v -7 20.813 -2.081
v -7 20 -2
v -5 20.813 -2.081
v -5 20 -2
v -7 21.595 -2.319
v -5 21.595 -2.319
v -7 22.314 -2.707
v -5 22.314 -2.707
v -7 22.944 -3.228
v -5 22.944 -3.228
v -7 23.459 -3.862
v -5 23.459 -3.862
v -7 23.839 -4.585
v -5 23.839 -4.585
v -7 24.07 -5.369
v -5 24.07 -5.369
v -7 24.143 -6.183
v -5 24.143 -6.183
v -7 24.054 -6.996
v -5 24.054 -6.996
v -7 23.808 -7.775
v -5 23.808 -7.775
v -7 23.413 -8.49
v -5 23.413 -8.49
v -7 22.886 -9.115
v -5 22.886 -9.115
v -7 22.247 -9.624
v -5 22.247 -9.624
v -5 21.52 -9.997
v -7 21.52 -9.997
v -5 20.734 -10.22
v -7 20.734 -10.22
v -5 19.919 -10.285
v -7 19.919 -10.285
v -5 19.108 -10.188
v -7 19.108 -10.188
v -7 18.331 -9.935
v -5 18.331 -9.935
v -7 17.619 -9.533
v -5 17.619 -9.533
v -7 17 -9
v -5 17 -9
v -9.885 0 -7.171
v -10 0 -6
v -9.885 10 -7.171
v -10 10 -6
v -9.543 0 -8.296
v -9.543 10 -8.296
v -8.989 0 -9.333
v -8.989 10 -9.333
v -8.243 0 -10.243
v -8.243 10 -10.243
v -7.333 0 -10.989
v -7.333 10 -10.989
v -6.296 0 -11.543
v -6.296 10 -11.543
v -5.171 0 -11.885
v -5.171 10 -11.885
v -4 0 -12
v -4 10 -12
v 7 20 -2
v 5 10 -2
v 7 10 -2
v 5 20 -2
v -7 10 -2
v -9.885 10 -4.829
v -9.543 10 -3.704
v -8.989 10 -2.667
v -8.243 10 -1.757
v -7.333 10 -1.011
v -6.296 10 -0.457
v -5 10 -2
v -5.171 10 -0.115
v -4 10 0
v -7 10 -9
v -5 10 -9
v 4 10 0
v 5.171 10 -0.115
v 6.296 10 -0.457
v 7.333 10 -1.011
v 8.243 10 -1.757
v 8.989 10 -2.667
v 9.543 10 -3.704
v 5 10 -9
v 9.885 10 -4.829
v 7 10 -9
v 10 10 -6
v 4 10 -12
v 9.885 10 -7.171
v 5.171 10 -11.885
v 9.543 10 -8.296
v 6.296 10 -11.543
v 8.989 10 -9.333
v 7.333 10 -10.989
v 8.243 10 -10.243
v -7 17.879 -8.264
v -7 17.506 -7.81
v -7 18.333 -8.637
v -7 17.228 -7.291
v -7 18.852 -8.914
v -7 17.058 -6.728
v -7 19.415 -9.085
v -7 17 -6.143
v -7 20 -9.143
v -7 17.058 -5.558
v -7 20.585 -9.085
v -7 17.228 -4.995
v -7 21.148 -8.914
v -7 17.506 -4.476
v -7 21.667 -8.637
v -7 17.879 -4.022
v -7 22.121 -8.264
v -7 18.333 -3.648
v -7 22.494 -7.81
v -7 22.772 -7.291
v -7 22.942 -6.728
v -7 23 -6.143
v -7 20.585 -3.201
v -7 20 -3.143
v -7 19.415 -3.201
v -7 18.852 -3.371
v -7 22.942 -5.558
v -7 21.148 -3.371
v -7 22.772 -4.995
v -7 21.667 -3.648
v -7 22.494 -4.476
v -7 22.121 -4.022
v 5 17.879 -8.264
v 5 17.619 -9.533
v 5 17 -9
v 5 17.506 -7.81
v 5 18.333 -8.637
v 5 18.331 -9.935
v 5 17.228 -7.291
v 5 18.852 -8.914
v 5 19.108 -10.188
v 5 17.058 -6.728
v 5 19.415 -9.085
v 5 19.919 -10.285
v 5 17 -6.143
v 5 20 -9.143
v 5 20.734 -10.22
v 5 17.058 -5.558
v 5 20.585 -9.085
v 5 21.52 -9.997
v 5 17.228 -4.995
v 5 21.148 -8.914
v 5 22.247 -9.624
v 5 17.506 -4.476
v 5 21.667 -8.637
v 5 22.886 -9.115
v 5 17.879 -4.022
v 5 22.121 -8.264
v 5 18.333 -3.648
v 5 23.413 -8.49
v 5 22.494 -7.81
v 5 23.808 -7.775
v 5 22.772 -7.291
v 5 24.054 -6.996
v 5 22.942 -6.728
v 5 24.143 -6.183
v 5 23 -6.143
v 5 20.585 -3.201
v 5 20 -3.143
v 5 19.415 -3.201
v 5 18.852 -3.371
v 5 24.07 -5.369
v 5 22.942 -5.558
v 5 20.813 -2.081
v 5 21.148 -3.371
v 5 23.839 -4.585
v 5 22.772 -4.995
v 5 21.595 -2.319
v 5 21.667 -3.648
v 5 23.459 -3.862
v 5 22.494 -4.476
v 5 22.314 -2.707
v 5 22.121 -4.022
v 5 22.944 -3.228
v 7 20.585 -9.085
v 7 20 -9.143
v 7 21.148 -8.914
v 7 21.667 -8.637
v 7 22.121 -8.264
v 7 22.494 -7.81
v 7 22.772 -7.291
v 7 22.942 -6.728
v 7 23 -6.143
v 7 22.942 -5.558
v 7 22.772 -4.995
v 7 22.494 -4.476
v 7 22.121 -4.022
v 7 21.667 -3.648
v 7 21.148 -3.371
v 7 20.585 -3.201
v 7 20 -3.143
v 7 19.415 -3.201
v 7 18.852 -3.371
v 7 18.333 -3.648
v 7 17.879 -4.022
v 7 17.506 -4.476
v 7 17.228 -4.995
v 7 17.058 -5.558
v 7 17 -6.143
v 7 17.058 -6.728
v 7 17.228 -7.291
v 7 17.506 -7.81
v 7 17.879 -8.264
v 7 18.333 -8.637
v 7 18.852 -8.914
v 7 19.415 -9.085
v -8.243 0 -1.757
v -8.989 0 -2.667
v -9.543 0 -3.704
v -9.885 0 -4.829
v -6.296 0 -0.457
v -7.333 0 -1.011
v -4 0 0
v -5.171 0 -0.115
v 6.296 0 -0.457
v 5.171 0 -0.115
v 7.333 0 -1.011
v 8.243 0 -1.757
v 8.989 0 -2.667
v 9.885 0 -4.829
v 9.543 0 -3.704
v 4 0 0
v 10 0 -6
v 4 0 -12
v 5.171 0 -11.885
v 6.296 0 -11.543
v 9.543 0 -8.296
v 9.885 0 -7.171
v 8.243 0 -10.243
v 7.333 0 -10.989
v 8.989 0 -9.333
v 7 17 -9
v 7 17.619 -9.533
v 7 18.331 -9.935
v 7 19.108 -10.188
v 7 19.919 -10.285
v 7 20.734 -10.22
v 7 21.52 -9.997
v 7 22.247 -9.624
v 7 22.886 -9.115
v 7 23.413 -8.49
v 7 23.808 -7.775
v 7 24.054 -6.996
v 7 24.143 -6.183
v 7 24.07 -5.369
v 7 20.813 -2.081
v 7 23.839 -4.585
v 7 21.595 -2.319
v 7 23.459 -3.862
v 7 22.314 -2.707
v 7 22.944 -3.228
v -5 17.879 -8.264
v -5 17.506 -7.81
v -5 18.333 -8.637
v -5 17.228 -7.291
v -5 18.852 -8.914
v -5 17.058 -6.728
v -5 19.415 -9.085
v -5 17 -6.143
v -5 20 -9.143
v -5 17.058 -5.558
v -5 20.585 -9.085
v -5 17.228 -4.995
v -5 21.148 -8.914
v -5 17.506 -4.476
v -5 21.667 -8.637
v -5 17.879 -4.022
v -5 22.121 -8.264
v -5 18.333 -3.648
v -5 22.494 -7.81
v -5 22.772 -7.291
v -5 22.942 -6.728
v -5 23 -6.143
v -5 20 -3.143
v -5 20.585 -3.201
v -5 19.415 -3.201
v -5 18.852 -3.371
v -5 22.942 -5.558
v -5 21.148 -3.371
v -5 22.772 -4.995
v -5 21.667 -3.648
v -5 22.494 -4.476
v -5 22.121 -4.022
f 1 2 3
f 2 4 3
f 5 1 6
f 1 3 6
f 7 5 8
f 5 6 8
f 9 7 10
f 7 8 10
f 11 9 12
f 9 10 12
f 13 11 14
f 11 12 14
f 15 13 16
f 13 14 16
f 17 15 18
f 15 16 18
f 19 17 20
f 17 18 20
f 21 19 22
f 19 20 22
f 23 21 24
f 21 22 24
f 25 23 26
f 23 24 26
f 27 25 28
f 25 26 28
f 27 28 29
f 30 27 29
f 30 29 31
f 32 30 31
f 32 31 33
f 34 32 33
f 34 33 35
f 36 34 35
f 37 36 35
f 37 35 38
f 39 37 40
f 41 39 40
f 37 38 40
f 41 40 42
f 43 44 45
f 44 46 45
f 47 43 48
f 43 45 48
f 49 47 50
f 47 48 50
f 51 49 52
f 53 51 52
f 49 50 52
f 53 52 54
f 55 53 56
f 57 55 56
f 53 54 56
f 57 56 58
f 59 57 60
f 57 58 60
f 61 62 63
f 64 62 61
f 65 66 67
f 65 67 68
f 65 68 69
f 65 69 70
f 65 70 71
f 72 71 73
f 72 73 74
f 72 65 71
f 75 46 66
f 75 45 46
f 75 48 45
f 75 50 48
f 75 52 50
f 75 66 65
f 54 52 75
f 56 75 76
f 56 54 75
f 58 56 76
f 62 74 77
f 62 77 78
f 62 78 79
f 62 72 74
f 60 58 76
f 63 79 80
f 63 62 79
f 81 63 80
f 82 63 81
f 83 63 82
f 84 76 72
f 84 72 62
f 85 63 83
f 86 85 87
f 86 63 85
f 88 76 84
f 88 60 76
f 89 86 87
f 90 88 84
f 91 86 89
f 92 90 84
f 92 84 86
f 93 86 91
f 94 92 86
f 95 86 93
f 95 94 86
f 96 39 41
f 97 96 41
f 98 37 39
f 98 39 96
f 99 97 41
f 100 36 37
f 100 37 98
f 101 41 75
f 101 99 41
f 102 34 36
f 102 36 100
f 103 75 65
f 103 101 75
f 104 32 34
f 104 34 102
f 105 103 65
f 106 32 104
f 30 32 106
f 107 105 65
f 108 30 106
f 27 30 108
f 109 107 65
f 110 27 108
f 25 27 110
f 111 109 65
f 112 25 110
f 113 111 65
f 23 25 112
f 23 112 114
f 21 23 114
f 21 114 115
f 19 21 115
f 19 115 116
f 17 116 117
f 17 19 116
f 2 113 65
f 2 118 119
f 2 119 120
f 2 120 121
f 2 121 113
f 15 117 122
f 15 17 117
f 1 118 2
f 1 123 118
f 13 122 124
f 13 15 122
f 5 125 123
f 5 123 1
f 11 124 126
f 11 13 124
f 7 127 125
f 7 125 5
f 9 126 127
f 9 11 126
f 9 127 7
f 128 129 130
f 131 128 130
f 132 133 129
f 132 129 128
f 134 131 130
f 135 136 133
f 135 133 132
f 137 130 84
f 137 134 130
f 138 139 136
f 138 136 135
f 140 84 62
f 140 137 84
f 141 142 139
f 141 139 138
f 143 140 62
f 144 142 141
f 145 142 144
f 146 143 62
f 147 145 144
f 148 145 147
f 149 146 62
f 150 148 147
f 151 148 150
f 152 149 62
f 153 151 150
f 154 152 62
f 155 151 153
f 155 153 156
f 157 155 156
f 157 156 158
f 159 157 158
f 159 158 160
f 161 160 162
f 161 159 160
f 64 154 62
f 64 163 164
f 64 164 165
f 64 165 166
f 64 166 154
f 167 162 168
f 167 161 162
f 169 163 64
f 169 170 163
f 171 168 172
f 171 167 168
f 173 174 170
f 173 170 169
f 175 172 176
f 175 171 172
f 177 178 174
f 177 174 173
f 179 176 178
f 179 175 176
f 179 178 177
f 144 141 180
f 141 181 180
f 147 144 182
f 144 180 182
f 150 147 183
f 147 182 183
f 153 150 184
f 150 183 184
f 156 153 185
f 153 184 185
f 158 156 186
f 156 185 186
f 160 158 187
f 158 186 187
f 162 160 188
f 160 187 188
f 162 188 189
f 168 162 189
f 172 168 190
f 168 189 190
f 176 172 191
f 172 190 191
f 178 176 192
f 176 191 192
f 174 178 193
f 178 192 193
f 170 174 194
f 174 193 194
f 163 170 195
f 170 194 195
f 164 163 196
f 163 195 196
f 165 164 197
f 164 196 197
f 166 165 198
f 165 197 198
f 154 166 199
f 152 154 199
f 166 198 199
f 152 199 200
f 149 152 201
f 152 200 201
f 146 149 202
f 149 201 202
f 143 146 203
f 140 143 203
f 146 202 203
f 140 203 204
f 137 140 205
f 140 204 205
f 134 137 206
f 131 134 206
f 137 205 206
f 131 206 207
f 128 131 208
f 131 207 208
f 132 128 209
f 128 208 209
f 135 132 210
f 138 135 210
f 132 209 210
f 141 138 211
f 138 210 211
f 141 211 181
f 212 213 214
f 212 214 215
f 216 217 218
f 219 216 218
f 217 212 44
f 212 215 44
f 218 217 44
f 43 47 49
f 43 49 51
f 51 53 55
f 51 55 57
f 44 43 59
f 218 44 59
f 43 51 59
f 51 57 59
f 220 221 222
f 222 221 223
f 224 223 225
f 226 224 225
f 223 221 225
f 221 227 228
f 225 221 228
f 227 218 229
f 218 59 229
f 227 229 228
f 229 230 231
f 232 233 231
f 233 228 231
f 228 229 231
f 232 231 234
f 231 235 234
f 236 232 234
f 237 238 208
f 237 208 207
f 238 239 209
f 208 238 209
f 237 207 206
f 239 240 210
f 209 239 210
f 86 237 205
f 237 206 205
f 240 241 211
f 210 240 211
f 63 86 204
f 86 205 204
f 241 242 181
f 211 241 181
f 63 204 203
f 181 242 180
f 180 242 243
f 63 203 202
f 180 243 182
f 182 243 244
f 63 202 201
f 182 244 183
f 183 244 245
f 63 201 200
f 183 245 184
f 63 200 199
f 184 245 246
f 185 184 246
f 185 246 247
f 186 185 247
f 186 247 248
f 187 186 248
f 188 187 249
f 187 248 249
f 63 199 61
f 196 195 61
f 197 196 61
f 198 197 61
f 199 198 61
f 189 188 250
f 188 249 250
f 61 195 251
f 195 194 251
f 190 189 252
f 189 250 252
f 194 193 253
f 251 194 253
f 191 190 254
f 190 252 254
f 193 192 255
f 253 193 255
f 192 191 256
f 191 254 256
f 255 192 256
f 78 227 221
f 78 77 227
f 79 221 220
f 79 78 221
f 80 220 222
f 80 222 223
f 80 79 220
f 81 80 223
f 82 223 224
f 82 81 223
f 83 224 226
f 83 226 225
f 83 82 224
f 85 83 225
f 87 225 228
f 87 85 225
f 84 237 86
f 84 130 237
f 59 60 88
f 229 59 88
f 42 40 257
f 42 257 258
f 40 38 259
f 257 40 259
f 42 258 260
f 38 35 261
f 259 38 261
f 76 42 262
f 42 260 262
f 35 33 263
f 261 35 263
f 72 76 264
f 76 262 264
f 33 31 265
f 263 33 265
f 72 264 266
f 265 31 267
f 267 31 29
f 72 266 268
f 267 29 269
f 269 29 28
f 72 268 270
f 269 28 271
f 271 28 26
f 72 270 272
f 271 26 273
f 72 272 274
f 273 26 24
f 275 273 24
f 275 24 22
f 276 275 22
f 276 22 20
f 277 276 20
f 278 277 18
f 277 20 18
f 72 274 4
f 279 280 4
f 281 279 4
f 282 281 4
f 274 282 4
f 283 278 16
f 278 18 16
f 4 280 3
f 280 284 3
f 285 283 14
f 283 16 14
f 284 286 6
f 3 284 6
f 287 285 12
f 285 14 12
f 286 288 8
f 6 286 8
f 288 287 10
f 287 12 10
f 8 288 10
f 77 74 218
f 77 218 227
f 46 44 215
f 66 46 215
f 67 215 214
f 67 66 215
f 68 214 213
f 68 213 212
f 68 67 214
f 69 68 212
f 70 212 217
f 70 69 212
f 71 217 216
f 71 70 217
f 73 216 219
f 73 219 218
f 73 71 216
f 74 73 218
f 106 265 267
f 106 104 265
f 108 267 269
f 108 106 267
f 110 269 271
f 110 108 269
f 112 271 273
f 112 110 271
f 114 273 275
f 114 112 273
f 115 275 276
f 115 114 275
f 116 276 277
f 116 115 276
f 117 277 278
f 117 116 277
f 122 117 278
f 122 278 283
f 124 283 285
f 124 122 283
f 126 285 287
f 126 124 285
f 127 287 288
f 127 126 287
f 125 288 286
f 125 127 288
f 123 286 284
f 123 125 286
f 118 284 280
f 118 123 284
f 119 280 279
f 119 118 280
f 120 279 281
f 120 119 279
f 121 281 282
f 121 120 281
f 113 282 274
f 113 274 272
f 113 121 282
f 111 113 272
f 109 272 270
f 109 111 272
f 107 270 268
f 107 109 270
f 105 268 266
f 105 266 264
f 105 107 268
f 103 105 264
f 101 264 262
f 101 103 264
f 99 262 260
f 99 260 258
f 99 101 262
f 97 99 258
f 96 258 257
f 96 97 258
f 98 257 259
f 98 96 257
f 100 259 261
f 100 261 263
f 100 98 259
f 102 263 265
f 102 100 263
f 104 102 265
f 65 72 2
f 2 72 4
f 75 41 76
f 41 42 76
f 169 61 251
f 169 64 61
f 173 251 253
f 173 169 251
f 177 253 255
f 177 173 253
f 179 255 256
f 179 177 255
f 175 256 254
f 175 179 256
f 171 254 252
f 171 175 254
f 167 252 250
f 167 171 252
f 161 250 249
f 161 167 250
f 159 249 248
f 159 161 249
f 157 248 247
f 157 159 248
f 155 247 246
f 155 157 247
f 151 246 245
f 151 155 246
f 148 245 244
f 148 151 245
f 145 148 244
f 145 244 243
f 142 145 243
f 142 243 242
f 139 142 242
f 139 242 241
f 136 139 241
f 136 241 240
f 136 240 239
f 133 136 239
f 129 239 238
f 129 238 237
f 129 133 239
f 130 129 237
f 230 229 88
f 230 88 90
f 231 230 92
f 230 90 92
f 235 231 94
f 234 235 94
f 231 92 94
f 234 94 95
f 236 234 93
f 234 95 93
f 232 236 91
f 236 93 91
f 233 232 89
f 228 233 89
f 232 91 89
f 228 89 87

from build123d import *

# Parameters (mm, degrees)
SKETCH1_W           = 20
SKETCH1_H           = 12
BOSS_EXTRUDE1_DEPTH = 10
SKETCH4_R           = 3
BOSS_EXTRUDE2_DEPTH = 1
FILLET1_R           = 6


with BuildPart() as part:
    # Sketch1 → Boss-Extrude1 (new body)
    with BuildSketch(Plane(origin=(0, 0, 0), x_dir=(1, 0, 0), z_dir=(0, 1, 0))):
        with Locations((0, 6)):
            Rectangle(SKETCH1_W, SKETCH1_H)
    extrude(amount=BOSS_EXTRUDE1_DEPTH)

    # Sketch4 → Boss-Extrude2 (add, symmetric)
    with BuildSketch(Plane(origin=(-6, 0, 0), x_dir=(0, 0, -1), z_dir=(1, 0, 0))):
        with BuildLine():
            Line((2, 10), (2, 20))
            ThreePointArc((2, 20), (7.774808523, 23.807886553), (9, 17))
            Line((9, 17), (9, 10))
            Line((9, 10), (2, 10))
        make_face()
        with Locations((6.142857143, 20)):
            Circle(SKETCH4_R, mode=Mode.SUBTRACT)
    boss_extrude2 = extrude(amount=BOSS_EXTRUDE2_DEPTH, both=True)

    # Mirror1: Boss-Extrude2 across plane
    add(boss_extrude2.mirror(Plane(origin=(0, 0, 0), x_dir=(0, 0, 1), z_dir=(1, 0, 0))))

    # Fillet1
    fillet1_edges = [part.edges().sort_by_distance(p)[0] for p in [
        (-10, 5, -12),
        (10, 5, -12),
        (10, 5, 0),
        (-10, 5, 0),
    ]]
    fillet(fillet1_edges, radius=FILLET1_R - 0.0001)  # a hair under: the kernel refuses the full size


solid = part.part
